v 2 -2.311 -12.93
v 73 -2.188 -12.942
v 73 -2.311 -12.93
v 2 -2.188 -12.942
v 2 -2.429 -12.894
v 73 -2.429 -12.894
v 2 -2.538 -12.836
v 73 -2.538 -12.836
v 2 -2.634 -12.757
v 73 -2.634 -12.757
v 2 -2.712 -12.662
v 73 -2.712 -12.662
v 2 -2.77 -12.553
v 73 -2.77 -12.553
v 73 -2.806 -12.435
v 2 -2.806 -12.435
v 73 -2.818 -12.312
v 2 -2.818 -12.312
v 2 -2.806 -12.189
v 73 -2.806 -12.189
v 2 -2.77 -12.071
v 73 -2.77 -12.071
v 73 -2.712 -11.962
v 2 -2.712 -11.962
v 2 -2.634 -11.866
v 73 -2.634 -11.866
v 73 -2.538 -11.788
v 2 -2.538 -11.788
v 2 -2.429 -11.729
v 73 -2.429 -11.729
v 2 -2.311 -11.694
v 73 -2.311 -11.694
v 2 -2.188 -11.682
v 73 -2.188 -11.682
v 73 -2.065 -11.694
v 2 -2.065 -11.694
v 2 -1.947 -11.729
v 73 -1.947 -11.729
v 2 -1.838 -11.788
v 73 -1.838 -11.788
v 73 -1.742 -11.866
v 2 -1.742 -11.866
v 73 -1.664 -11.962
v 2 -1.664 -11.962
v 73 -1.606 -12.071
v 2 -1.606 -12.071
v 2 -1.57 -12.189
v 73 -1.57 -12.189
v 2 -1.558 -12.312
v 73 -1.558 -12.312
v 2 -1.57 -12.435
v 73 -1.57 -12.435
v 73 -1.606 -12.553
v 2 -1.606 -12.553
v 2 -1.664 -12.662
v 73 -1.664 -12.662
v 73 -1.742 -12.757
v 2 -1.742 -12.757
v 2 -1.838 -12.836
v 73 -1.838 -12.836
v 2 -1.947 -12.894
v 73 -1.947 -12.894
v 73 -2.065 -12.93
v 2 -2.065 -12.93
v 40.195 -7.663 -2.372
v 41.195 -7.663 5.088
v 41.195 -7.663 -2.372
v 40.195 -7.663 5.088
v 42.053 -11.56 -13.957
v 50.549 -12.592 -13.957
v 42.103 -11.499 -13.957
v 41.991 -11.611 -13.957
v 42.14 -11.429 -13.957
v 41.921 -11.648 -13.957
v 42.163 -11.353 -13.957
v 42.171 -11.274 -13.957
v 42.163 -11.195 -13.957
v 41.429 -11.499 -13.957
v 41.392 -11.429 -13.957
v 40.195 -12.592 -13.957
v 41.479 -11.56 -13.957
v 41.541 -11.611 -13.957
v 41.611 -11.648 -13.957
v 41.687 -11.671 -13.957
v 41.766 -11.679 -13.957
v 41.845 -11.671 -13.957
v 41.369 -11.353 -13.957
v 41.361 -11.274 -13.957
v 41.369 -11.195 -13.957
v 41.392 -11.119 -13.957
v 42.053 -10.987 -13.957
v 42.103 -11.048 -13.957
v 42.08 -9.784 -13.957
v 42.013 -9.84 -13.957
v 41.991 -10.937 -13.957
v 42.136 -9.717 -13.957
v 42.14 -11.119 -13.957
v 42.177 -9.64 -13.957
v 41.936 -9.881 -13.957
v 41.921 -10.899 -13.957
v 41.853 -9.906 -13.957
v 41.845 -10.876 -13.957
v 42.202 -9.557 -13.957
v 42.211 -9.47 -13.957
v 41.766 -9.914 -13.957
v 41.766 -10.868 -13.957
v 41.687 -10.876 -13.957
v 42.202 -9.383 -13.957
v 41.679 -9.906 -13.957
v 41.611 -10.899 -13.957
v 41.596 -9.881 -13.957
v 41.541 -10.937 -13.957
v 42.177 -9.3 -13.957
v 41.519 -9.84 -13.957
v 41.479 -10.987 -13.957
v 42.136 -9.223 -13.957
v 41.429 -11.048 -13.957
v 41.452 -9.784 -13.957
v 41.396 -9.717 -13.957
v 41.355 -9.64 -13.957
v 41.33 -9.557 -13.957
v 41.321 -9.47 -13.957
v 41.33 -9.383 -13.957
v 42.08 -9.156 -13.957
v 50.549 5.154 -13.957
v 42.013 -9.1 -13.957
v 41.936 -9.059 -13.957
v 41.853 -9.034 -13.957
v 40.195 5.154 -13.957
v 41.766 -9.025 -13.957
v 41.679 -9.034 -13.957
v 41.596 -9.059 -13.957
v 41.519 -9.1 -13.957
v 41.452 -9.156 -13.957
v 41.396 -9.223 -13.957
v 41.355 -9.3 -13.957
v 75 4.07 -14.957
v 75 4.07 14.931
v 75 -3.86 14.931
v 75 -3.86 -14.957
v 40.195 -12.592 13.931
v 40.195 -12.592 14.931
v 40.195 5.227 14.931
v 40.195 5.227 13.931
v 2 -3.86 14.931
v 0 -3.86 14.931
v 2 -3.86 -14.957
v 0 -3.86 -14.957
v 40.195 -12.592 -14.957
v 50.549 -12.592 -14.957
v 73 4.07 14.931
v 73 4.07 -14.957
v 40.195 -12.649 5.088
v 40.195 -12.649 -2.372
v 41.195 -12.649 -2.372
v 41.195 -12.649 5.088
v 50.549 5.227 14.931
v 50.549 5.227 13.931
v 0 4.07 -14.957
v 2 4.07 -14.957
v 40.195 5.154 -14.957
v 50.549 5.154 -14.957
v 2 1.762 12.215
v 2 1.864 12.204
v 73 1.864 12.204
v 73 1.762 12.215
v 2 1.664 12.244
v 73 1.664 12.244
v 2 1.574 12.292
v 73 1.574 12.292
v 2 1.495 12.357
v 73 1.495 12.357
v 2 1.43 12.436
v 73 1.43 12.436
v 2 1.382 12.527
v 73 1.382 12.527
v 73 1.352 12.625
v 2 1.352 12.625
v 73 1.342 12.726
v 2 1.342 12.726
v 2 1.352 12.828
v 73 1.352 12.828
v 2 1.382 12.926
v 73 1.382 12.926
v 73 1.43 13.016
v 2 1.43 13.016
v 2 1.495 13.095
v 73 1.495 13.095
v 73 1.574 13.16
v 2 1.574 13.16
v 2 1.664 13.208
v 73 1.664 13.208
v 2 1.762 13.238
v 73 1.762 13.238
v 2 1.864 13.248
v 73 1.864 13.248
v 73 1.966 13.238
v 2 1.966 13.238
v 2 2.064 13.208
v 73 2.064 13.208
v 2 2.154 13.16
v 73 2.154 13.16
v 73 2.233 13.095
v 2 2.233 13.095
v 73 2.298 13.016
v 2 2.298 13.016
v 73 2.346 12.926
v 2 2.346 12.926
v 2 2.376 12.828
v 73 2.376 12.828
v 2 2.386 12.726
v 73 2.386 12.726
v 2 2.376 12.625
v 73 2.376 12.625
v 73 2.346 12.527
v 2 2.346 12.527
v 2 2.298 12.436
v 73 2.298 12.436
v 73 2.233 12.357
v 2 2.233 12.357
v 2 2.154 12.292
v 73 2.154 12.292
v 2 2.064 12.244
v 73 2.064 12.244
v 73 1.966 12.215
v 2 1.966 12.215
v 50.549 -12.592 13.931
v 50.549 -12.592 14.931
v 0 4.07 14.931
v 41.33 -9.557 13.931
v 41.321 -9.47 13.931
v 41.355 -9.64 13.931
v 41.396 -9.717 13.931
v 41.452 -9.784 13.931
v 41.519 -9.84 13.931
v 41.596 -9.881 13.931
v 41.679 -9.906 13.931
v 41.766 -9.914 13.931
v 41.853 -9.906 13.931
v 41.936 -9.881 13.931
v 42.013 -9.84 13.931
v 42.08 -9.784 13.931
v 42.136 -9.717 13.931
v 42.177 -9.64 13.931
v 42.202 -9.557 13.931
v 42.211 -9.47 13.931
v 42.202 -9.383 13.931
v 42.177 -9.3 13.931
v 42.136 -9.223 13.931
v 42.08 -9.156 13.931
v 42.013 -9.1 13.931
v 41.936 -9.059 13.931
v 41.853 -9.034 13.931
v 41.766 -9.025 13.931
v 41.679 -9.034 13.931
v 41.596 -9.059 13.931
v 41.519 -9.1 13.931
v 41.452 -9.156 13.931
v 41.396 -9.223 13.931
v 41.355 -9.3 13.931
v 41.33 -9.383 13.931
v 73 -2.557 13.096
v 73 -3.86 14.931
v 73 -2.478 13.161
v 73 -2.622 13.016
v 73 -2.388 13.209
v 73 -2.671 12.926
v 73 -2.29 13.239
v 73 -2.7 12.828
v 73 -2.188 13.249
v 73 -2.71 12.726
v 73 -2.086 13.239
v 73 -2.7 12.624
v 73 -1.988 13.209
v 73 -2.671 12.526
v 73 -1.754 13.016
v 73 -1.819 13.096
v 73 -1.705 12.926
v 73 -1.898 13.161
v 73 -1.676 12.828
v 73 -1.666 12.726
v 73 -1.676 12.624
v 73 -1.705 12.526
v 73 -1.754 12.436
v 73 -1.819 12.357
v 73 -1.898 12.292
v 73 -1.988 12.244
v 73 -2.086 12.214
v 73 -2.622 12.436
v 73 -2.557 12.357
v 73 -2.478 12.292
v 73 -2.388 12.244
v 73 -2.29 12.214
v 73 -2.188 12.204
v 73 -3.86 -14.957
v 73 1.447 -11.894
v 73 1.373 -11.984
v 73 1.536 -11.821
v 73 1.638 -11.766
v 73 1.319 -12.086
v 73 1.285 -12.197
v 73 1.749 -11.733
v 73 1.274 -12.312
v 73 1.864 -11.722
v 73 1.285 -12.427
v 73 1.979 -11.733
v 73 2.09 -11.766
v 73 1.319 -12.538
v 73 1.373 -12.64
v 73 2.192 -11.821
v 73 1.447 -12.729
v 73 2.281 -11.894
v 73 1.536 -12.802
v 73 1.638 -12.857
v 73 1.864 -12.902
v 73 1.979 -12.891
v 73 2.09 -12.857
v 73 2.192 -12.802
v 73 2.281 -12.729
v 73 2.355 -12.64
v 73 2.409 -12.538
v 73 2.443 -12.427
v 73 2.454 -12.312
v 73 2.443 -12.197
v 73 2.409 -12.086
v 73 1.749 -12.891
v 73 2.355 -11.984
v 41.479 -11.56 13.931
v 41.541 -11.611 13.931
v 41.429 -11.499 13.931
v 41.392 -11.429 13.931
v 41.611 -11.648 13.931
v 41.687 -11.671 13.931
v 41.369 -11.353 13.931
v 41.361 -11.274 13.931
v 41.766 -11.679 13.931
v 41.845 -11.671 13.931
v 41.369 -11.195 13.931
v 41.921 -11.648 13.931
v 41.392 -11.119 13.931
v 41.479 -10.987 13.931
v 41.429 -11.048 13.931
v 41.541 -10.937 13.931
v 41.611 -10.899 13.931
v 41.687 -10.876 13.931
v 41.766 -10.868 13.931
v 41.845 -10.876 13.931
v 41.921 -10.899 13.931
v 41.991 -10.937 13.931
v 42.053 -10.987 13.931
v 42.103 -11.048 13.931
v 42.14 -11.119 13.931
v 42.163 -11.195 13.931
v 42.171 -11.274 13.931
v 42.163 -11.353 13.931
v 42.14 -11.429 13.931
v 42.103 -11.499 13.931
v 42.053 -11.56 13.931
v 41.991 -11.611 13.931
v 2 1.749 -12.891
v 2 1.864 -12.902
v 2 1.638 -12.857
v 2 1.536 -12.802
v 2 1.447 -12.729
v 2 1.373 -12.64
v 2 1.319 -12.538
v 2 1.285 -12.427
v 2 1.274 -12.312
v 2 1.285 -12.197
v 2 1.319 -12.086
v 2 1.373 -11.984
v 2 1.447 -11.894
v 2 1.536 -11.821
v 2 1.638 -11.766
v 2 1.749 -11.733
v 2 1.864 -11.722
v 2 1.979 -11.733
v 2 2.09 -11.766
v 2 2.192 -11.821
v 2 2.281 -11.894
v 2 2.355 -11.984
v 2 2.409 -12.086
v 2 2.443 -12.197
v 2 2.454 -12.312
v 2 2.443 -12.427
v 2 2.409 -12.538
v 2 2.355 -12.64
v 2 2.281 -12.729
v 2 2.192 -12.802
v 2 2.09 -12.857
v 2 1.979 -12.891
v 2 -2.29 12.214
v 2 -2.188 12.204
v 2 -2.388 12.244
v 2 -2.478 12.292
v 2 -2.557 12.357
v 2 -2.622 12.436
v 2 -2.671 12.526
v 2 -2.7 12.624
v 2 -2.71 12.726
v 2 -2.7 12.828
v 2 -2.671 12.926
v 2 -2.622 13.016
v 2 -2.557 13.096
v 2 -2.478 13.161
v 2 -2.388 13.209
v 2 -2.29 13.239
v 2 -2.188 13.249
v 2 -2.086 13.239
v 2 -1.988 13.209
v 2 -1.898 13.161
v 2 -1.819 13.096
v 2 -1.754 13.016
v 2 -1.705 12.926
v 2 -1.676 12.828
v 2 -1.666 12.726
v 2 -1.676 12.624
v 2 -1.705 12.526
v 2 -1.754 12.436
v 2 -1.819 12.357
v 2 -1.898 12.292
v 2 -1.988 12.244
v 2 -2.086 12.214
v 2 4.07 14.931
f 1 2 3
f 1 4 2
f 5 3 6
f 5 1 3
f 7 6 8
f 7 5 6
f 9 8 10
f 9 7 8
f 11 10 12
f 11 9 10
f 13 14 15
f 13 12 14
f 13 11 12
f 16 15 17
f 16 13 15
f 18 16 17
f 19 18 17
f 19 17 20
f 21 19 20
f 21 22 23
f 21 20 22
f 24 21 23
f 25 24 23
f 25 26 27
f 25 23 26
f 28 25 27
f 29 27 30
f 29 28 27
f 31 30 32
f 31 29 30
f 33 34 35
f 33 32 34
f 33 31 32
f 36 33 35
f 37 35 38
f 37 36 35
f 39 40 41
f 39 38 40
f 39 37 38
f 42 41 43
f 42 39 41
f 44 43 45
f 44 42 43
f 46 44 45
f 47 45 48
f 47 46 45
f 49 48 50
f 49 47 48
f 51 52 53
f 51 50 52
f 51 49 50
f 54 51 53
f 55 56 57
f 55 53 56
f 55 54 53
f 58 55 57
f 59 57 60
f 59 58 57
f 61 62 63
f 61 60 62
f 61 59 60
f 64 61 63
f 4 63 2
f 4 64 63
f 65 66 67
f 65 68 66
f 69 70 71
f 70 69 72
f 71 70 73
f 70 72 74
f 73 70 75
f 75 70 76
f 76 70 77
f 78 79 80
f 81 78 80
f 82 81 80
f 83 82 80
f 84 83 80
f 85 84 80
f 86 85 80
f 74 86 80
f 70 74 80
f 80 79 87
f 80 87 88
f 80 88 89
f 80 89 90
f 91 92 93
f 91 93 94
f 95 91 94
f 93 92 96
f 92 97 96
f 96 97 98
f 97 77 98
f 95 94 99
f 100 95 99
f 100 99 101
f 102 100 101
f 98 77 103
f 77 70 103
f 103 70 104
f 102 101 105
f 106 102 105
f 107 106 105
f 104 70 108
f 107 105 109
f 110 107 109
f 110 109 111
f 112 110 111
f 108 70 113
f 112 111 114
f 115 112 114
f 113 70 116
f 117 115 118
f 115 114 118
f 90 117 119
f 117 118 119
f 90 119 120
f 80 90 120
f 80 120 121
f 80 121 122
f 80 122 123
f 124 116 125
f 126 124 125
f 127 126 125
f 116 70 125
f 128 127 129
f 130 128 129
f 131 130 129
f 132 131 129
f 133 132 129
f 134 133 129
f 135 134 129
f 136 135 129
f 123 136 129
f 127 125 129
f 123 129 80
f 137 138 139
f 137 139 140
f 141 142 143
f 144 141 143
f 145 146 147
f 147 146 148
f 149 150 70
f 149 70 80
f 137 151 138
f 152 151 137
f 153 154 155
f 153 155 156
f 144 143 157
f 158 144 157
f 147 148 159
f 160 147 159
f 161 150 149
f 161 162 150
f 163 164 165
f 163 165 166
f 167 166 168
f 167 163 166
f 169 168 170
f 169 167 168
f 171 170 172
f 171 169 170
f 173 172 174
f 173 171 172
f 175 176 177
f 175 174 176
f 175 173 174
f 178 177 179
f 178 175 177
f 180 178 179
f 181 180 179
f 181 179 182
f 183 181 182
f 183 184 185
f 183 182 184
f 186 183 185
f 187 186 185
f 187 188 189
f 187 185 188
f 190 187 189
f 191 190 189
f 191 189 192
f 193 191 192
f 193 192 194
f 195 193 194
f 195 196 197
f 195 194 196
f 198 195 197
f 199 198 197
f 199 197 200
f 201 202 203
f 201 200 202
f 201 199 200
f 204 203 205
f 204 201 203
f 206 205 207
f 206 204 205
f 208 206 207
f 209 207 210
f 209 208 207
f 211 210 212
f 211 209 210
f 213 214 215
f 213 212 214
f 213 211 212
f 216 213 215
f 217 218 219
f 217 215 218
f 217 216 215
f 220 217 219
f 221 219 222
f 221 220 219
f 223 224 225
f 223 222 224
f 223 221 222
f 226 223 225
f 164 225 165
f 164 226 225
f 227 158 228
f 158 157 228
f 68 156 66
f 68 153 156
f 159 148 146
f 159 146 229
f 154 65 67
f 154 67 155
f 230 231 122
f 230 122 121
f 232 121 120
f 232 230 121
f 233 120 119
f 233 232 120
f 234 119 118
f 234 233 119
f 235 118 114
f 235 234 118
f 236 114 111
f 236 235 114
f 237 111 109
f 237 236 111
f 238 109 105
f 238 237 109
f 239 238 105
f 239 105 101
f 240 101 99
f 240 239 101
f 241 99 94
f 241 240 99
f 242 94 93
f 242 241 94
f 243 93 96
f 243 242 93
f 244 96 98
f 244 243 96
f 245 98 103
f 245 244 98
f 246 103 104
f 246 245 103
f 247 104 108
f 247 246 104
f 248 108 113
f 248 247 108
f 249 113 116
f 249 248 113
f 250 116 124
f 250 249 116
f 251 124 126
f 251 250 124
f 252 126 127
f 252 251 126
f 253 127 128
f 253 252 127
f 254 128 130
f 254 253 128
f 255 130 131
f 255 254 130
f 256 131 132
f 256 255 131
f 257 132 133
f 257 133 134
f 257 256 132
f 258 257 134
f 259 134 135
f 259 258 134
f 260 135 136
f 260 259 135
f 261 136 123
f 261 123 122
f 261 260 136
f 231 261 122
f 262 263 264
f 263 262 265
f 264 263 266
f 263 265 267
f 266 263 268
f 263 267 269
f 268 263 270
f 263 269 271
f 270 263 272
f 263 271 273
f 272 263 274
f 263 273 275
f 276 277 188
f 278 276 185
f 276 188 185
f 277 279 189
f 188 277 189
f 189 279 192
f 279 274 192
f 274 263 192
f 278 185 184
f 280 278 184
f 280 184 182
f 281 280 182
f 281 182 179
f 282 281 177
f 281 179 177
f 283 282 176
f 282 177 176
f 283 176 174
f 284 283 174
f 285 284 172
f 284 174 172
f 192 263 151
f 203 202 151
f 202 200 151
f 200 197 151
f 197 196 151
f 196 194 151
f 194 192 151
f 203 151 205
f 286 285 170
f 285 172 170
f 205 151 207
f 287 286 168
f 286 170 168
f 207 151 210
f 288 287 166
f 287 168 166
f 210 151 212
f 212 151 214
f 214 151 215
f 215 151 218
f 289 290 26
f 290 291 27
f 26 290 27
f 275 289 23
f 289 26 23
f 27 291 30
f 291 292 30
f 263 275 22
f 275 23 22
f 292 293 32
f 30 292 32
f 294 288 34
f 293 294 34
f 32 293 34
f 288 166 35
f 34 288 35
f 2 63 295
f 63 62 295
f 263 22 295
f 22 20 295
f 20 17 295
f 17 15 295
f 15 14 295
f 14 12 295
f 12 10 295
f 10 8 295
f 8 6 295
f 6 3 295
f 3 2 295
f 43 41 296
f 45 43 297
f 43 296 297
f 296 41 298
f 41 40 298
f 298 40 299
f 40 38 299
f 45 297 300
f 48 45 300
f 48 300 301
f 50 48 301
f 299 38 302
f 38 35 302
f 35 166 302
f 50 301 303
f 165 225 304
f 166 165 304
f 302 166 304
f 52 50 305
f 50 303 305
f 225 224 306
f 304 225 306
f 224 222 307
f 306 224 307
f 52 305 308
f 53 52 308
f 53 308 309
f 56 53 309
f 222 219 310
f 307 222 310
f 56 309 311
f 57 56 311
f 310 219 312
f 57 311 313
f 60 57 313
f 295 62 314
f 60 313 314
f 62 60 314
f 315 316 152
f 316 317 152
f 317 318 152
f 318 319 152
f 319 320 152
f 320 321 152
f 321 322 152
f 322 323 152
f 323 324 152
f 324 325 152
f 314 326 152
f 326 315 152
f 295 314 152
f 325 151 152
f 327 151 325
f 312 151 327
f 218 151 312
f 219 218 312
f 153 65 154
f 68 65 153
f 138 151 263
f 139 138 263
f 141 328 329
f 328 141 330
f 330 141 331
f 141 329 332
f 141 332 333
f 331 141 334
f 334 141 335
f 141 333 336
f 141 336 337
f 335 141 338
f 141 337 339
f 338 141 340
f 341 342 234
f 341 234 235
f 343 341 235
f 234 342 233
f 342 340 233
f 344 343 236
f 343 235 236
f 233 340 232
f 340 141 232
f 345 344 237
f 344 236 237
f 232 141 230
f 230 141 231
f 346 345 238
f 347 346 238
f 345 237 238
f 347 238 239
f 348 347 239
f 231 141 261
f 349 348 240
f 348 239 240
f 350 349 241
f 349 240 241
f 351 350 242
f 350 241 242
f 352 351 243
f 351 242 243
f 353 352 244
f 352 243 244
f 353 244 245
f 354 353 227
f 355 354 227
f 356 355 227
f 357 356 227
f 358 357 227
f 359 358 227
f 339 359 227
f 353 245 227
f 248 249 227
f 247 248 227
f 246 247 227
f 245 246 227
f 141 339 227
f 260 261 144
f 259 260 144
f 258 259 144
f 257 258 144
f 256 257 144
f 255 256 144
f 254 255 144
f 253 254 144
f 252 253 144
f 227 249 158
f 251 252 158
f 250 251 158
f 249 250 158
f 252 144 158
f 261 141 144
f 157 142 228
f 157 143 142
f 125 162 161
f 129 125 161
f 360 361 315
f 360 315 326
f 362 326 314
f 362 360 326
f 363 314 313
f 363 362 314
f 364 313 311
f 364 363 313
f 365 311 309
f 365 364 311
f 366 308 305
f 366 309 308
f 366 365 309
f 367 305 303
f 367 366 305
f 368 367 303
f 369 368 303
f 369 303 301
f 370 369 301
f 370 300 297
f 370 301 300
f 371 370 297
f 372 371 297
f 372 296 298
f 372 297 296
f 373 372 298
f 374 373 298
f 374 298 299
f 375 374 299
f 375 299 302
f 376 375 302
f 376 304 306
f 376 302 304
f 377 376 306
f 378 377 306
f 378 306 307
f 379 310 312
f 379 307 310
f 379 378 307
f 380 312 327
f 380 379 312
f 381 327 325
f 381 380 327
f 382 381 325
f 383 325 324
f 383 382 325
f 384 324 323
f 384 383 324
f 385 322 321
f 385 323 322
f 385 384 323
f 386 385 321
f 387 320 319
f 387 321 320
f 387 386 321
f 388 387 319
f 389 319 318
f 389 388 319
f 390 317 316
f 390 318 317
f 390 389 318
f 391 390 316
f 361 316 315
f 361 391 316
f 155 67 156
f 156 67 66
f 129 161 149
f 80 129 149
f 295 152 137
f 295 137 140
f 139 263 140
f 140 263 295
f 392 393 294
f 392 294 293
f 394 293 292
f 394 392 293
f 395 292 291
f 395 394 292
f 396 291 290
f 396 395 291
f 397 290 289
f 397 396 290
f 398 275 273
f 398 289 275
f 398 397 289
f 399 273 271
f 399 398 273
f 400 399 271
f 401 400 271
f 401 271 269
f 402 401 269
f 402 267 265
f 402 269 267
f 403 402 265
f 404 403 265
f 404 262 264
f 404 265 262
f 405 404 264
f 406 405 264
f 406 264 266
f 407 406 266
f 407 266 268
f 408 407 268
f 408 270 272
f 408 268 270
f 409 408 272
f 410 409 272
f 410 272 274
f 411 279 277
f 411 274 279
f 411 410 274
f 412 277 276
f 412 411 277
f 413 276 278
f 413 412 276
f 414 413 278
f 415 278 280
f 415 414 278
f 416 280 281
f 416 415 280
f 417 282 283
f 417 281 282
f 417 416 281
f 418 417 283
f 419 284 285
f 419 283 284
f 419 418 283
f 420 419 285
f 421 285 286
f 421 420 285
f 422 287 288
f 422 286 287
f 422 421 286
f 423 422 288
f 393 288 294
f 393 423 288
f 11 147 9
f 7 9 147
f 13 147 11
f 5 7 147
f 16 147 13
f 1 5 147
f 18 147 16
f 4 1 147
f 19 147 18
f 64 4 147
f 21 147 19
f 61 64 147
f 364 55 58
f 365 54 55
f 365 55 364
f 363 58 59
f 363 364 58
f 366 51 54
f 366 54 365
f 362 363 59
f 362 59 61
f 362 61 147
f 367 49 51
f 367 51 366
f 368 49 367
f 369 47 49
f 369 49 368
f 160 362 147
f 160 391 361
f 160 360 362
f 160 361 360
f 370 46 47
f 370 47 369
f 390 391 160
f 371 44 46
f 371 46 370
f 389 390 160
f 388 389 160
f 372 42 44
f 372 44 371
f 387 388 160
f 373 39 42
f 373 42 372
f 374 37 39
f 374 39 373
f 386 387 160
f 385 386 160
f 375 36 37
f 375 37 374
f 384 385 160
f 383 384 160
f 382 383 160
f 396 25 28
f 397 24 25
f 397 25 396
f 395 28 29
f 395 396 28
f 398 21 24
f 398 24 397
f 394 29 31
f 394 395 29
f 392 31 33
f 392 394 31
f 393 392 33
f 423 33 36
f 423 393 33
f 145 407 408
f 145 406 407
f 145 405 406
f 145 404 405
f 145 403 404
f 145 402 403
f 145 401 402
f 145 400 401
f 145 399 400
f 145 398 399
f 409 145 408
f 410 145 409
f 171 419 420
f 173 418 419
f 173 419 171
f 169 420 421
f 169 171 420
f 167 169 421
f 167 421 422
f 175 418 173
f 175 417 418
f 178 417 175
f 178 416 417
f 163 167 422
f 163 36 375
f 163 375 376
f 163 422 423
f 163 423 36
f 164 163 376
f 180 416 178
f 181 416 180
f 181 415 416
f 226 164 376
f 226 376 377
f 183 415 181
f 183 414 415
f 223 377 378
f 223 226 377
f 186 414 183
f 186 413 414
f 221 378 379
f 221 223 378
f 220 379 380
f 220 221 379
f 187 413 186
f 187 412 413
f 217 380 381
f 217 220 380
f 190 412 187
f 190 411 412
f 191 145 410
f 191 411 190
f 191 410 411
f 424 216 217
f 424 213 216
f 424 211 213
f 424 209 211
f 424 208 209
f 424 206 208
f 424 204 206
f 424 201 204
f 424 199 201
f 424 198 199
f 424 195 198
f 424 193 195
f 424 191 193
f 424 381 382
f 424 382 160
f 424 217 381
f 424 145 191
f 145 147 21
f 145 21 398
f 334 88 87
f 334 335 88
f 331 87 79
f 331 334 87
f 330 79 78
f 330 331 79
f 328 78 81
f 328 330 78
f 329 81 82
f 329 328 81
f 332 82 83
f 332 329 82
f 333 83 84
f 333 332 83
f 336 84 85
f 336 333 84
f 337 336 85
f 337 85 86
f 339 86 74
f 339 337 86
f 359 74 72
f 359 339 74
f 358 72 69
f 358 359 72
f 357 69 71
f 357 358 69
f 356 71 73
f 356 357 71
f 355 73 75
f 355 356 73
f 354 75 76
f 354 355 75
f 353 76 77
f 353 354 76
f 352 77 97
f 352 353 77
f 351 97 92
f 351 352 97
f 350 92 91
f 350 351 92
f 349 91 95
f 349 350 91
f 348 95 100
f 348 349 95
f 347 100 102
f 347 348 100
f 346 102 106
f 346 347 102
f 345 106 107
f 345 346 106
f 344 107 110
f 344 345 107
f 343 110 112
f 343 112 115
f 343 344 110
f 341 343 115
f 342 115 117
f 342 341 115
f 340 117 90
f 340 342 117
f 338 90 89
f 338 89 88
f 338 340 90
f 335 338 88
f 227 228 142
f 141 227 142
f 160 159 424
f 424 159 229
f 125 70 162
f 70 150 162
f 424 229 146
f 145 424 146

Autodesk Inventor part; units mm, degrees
ref_plane "YZ Plane" through (0, 0, 0) normal (1, 0, 0) x (0, 1, 0)
ref_plane "XZ Plane" through (0, 0, 0) normal (0, 1, 0) x (-1, 0, 0)
ref_plane "XY Plane" through (0, 0, 0) normal (0, 0, 1) x (1, 0, 0)
sketch "Sketch1" plane through (0, 0, 0) normal (1, 0, 0) x (0, 1, 0)
  line L0 (4.0704, 14.9312) -> (-3.8604, 14.9312)
  line L1 (-3.8604, 14.9312) -> (-3.8604, -14.9567)
  line L2 (-3.8604, -14.9567) -> (4.0704, -14.9567)
  line L3 (4.0704, -14.9567) -> (4.0704, 14.9312)
  line L4 (4.0704, 14.9312) -> (-3.8604, -14.9567) construction
  line L5 (-3.8604, 14.9312) -> (4.0704, -14.9567) construction
  point P0 (0, 0)
  point P1 (0.105, -0.0127)
extrude "Extrusion1" add sketch "Sketch1" along normal blind 2
sketch "Sketch2" plane through (2, 0, 0) normal (1, 0, 0) x (0, 0, -1)
  circle A0 centre (-12.7263, 1.8639) radius 0.5218
  circle A1 centre (-12.7263, -2.188) radius 0.5223
  circle A2 centre (12.3117, 1.8639) radius 0.5902
  circle A3 centre (12.3117, -2.188) radius 0.6302
  point P0 (0, 0)
extrude "Extrusion2" add sketch "Sketch2" along normal blind 71
sketch "Sketch3" plane through (73, 1.8639, 12.7263) normal (1, 0, 0) x (0, 0, -1)
  line L0 (-2.2049, 2.2065) -> (-2.2049, -5.7243) projected
  line L1 (-2.2049, -5.7243) -> (27.683, -5.7243) projected
  line L2 (-2.2049, 2.2065) -> (27.683, 2.2065)
  line L3 (27.683, 2.2065) -> (27.683, -5.7243)
  line L4 (27.683, -5.7243) -> (-2.2049, -5.7243)
  line L5 (-2.2049, -5.7243) -> (-2.2049, 2.2065)
  point P0 (12.7263, -1.8639)
extrude "Extrusion3" add sketch "Sketch3" along normal blind 2
sketch "Sketch4" plane through (0, -3.8604, 14.9312) normal (0, 0, 1) x (1, 0, 0)
  point P0 (0, 3.8604)
sketch "Sketch5" plane through (73, -3.8604, 14.9312) normal (0, 0, 1) x (1, 0, 0)
  line L0 (-22.4506, -8.7315) -> (-32.8047, -8.7315)
  line L1 (-32.8047, -8.7315) -> (-32.8047, 9.0871)
  line L2 (-32.8047, 9.0871) -> (-22.4506, 9.0871)
  line L3 (-22.4506, 9.0871) -> (-22.4506, -8.7315)
  point P0 (-73, 3.8604)
extrude "Extrusion4" add sketch "Sketch5" against normal blind 1
sketch "Sketch6" plane through (73, -3.8604, -14.9567) normal (0, 0, -1) x (-1, 0, 0)
  line L0 (22.4506, -8.7315) -> (32.8047, -8.7315) projected
  line L1 (32.8047, -8.7315) -> (22.4506, -8.7315)
  line L2 (22.4506, -8.7315) -> (22.4506, 9.0145)
  line L3 (22.4506, 9.0145) -> (32.8047, 9.0145)
  line L4 (32.8047, 9.0145) -> (32.8047, -8.7315)
  point P0 (73, 3.8604)
extrude "Extrusion5" add sketch "Sketch6" against normal blind 1
sketch "Sketch7" plane through (73, -3.8604, 13.9312) normal (0, 0, -1) x (-1, 0, 0)
  circle A0 centre (31.234, -7.4132) radius 0.4052
  point P0 (73, 3.8604)
extrude "Extrusion6" add sketch "Sketch7" along normal blind 28
sketch "Sketch8" plane through (73, -3.8604, 13.9312) normal (0, 0, -1) x (-1, 0, 0)
  circle A0 centre (31.234, -5.6095) radius 0.4446
  point P0 (73, 3.8604)
extrude "Extrusion7" add sketch "Sketch8" along normal blind 28
sketch "Sketch9" plane through (40.1953, -12.5919, -14.9567) normal (-1, 0, 0) x (0, 0, 1)
  point P0 (14.9567, 12.5919)
sketch "Sketch10" plane through (40.1953, -12.5919, 14.9312) normal (-1, 0, 0) x (0, 0, 1)
  line L0 (-9.8431, 4.9293) -> (-17.303, 4.9293)
  line L1 (-17.303, 4.9293) -> (-17.303, -0.0575)
  line L2 (-17.303, -0.0575) -> (-9.8431, -0.0575)
  line L3 (-9.8431, -0.0575) -> (-9.8431, 4.9293)
  point P0 (-14.9312, 12.5919)
extrude "Extrusion8" add sketch "Sketch10" against normal blind 1
properties part number "carving machine"
